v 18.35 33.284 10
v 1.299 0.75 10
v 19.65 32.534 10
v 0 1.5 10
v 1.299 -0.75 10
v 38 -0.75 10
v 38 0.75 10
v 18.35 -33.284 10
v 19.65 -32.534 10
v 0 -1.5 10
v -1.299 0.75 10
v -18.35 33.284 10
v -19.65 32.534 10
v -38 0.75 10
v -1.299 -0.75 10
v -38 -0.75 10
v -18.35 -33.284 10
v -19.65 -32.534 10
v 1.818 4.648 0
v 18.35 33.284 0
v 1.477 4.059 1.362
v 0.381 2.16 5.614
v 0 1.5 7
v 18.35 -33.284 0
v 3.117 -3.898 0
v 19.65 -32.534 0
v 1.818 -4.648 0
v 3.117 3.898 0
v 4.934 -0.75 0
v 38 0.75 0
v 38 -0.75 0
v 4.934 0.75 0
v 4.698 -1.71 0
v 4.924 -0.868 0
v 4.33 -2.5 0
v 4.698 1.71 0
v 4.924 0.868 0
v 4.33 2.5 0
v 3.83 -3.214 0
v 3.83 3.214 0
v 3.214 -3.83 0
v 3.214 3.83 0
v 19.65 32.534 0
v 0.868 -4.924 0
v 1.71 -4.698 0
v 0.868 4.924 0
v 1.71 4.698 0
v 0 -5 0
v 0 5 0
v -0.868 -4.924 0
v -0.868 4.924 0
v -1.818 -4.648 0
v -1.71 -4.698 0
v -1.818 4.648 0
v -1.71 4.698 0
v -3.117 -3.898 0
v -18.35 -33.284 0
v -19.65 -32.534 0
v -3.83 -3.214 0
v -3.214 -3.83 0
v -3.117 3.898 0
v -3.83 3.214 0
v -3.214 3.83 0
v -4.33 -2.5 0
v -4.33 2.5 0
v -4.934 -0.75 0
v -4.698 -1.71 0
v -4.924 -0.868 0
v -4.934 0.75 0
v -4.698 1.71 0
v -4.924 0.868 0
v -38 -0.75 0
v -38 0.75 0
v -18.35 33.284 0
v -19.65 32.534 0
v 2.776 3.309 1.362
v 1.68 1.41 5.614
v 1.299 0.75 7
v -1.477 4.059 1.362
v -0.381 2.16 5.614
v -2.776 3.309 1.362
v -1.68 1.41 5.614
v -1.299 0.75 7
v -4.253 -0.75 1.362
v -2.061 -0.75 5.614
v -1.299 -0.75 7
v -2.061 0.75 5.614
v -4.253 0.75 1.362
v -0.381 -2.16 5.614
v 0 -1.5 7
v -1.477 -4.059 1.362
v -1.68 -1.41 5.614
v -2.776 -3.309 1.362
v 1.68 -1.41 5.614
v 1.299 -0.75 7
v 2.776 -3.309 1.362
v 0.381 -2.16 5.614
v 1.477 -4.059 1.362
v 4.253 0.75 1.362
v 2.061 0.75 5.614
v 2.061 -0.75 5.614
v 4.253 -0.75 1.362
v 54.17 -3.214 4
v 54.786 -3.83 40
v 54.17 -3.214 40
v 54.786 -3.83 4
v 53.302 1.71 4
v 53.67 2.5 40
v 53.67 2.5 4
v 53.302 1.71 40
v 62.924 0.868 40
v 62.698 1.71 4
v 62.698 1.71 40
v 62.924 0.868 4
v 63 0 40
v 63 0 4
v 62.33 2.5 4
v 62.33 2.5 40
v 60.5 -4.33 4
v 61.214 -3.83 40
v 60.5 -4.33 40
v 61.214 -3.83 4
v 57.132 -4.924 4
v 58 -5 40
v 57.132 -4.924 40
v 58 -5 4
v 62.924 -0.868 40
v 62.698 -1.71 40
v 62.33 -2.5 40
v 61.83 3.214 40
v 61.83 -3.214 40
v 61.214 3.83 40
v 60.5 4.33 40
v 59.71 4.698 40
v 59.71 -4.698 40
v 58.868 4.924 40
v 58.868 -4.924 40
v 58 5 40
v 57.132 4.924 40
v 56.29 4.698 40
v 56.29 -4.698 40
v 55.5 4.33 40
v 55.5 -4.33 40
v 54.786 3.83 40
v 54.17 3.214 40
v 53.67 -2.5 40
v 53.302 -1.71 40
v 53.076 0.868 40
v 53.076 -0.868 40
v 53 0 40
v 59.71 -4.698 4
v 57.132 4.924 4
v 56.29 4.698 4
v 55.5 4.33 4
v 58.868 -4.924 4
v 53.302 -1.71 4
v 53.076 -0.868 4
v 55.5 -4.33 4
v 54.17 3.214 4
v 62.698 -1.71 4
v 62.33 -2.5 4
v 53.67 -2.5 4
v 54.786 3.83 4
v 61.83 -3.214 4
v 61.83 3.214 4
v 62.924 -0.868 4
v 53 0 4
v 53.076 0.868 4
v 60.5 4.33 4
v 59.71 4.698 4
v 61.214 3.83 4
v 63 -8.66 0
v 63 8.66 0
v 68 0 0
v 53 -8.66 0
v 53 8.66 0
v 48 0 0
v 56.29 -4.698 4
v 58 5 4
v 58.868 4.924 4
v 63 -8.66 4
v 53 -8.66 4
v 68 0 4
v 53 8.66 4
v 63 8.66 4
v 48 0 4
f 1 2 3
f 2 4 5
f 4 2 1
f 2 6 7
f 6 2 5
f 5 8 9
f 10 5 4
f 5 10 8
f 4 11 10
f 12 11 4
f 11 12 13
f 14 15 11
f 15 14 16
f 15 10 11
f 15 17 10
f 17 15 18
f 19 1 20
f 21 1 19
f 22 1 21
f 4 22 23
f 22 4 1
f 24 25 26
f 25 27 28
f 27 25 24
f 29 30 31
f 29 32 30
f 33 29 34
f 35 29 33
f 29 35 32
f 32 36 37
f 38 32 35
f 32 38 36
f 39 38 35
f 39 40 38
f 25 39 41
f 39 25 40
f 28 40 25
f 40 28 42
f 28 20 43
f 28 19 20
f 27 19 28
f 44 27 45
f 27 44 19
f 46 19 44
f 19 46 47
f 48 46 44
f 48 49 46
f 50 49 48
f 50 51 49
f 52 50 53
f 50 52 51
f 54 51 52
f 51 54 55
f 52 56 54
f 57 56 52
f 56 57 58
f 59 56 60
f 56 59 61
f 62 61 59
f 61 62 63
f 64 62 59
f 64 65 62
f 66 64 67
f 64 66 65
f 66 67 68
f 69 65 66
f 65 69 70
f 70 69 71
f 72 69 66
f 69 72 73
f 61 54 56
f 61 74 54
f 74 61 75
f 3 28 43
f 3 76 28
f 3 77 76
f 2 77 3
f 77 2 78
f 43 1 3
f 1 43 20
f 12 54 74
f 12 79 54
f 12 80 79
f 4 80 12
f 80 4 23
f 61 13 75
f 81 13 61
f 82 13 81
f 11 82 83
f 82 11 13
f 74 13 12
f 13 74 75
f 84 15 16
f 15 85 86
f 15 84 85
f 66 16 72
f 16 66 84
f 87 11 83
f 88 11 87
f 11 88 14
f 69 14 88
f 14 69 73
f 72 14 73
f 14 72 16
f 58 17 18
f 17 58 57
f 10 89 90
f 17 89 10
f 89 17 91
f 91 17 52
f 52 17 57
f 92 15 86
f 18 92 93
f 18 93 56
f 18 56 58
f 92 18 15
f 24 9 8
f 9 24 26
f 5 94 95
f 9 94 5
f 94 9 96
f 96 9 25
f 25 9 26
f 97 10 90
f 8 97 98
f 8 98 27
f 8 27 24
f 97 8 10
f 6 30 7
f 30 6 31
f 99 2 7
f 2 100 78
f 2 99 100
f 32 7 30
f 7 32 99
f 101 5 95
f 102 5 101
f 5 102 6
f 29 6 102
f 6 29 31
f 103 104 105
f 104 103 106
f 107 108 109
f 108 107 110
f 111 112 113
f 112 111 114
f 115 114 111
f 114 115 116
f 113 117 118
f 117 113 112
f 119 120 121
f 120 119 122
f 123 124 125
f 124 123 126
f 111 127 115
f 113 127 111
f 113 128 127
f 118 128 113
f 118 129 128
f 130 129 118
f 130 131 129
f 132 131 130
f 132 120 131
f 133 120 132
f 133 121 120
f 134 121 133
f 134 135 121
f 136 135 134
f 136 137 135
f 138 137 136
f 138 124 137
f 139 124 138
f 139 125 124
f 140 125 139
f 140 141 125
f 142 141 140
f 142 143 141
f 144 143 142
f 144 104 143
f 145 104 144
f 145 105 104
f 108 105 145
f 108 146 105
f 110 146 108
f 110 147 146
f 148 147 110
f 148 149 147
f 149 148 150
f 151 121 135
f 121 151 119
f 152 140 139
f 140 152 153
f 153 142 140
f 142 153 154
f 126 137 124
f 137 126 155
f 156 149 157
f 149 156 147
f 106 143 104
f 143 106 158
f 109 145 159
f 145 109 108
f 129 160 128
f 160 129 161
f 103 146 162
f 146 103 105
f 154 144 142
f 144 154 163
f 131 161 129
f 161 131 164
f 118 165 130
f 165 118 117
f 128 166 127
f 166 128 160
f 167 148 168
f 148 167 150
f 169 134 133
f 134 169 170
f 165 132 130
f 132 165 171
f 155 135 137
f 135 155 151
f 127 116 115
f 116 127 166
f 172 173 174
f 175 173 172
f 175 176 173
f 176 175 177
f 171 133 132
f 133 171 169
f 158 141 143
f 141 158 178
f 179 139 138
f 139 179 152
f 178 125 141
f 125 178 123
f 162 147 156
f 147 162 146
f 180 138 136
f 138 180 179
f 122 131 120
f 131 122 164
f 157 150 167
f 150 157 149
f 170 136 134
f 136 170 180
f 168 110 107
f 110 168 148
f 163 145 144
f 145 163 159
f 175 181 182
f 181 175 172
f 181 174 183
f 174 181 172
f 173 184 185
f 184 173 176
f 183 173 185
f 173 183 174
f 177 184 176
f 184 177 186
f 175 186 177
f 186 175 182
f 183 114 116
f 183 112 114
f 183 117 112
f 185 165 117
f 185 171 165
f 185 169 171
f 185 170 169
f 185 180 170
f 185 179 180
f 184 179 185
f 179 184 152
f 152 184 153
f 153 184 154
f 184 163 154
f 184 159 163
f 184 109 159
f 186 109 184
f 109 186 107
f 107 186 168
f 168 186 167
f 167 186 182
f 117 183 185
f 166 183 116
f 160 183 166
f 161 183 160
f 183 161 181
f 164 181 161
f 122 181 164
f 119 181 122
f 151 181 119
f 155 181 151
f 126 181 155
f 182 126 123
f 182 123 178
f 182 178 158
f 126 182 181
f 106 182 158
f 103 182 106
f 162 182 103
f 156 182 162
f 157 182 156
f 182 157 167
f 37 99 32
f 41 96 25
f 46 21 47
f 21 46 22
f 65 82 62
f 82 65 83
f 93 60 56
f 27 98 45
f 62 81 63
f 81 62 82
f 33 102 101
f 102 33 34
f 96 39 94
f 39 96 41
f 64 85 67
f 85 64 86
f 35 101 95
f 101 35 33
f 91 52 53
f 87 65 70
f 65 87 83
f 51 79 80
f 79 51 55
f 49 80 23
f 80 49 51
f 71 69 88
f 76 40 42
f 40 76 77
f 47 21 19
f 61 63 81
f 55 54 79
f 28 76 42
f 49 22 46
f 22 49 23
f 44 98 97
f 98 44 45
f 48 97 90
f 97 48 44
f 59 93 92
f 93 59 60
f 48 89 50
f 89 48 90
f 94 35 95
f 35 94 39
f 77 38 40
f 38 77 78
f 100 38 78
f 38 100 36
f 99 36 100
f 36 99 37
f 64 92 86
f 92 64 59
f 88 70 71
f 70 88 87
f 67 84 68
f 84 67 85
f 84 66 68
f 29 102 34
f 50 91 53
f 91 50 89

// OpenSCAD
// Pet Food Slicer
// Hari Wiguna, 2014

sliceDiameter = 76;
sliceRadius = sliceDiameter/2;
sliceCount = 6;
sliceHeight = 10; //41;
thickness = 1.5;

stemRadius = 5;
stemHeight = 40;
handleRadius = 10;
handleHeight = 4;

$fn = 36;

union() {

	//-- Slicers --
	for (r=[1:sliceCount])
	{
		rotate(360*r/sliceCount,[0,0,1])
			translate([0,-thickness/2,0])
				cube([sliceRadius,thickness,sliceHeight]);
	}

	//-- Stem base --
	cylinder(sliceHeight,stemRadius,0);

	//-- Handle --
	translate([sliceRadius+handleRadius+10,0,0]) 
		Handle();
}


module Handle()
{
	union() {
		cylinder(stemHeight,stemRadius,stemRadius);
		cylinder(h=handleHeight,r=handleRadius, $fn=6);
	}
}
